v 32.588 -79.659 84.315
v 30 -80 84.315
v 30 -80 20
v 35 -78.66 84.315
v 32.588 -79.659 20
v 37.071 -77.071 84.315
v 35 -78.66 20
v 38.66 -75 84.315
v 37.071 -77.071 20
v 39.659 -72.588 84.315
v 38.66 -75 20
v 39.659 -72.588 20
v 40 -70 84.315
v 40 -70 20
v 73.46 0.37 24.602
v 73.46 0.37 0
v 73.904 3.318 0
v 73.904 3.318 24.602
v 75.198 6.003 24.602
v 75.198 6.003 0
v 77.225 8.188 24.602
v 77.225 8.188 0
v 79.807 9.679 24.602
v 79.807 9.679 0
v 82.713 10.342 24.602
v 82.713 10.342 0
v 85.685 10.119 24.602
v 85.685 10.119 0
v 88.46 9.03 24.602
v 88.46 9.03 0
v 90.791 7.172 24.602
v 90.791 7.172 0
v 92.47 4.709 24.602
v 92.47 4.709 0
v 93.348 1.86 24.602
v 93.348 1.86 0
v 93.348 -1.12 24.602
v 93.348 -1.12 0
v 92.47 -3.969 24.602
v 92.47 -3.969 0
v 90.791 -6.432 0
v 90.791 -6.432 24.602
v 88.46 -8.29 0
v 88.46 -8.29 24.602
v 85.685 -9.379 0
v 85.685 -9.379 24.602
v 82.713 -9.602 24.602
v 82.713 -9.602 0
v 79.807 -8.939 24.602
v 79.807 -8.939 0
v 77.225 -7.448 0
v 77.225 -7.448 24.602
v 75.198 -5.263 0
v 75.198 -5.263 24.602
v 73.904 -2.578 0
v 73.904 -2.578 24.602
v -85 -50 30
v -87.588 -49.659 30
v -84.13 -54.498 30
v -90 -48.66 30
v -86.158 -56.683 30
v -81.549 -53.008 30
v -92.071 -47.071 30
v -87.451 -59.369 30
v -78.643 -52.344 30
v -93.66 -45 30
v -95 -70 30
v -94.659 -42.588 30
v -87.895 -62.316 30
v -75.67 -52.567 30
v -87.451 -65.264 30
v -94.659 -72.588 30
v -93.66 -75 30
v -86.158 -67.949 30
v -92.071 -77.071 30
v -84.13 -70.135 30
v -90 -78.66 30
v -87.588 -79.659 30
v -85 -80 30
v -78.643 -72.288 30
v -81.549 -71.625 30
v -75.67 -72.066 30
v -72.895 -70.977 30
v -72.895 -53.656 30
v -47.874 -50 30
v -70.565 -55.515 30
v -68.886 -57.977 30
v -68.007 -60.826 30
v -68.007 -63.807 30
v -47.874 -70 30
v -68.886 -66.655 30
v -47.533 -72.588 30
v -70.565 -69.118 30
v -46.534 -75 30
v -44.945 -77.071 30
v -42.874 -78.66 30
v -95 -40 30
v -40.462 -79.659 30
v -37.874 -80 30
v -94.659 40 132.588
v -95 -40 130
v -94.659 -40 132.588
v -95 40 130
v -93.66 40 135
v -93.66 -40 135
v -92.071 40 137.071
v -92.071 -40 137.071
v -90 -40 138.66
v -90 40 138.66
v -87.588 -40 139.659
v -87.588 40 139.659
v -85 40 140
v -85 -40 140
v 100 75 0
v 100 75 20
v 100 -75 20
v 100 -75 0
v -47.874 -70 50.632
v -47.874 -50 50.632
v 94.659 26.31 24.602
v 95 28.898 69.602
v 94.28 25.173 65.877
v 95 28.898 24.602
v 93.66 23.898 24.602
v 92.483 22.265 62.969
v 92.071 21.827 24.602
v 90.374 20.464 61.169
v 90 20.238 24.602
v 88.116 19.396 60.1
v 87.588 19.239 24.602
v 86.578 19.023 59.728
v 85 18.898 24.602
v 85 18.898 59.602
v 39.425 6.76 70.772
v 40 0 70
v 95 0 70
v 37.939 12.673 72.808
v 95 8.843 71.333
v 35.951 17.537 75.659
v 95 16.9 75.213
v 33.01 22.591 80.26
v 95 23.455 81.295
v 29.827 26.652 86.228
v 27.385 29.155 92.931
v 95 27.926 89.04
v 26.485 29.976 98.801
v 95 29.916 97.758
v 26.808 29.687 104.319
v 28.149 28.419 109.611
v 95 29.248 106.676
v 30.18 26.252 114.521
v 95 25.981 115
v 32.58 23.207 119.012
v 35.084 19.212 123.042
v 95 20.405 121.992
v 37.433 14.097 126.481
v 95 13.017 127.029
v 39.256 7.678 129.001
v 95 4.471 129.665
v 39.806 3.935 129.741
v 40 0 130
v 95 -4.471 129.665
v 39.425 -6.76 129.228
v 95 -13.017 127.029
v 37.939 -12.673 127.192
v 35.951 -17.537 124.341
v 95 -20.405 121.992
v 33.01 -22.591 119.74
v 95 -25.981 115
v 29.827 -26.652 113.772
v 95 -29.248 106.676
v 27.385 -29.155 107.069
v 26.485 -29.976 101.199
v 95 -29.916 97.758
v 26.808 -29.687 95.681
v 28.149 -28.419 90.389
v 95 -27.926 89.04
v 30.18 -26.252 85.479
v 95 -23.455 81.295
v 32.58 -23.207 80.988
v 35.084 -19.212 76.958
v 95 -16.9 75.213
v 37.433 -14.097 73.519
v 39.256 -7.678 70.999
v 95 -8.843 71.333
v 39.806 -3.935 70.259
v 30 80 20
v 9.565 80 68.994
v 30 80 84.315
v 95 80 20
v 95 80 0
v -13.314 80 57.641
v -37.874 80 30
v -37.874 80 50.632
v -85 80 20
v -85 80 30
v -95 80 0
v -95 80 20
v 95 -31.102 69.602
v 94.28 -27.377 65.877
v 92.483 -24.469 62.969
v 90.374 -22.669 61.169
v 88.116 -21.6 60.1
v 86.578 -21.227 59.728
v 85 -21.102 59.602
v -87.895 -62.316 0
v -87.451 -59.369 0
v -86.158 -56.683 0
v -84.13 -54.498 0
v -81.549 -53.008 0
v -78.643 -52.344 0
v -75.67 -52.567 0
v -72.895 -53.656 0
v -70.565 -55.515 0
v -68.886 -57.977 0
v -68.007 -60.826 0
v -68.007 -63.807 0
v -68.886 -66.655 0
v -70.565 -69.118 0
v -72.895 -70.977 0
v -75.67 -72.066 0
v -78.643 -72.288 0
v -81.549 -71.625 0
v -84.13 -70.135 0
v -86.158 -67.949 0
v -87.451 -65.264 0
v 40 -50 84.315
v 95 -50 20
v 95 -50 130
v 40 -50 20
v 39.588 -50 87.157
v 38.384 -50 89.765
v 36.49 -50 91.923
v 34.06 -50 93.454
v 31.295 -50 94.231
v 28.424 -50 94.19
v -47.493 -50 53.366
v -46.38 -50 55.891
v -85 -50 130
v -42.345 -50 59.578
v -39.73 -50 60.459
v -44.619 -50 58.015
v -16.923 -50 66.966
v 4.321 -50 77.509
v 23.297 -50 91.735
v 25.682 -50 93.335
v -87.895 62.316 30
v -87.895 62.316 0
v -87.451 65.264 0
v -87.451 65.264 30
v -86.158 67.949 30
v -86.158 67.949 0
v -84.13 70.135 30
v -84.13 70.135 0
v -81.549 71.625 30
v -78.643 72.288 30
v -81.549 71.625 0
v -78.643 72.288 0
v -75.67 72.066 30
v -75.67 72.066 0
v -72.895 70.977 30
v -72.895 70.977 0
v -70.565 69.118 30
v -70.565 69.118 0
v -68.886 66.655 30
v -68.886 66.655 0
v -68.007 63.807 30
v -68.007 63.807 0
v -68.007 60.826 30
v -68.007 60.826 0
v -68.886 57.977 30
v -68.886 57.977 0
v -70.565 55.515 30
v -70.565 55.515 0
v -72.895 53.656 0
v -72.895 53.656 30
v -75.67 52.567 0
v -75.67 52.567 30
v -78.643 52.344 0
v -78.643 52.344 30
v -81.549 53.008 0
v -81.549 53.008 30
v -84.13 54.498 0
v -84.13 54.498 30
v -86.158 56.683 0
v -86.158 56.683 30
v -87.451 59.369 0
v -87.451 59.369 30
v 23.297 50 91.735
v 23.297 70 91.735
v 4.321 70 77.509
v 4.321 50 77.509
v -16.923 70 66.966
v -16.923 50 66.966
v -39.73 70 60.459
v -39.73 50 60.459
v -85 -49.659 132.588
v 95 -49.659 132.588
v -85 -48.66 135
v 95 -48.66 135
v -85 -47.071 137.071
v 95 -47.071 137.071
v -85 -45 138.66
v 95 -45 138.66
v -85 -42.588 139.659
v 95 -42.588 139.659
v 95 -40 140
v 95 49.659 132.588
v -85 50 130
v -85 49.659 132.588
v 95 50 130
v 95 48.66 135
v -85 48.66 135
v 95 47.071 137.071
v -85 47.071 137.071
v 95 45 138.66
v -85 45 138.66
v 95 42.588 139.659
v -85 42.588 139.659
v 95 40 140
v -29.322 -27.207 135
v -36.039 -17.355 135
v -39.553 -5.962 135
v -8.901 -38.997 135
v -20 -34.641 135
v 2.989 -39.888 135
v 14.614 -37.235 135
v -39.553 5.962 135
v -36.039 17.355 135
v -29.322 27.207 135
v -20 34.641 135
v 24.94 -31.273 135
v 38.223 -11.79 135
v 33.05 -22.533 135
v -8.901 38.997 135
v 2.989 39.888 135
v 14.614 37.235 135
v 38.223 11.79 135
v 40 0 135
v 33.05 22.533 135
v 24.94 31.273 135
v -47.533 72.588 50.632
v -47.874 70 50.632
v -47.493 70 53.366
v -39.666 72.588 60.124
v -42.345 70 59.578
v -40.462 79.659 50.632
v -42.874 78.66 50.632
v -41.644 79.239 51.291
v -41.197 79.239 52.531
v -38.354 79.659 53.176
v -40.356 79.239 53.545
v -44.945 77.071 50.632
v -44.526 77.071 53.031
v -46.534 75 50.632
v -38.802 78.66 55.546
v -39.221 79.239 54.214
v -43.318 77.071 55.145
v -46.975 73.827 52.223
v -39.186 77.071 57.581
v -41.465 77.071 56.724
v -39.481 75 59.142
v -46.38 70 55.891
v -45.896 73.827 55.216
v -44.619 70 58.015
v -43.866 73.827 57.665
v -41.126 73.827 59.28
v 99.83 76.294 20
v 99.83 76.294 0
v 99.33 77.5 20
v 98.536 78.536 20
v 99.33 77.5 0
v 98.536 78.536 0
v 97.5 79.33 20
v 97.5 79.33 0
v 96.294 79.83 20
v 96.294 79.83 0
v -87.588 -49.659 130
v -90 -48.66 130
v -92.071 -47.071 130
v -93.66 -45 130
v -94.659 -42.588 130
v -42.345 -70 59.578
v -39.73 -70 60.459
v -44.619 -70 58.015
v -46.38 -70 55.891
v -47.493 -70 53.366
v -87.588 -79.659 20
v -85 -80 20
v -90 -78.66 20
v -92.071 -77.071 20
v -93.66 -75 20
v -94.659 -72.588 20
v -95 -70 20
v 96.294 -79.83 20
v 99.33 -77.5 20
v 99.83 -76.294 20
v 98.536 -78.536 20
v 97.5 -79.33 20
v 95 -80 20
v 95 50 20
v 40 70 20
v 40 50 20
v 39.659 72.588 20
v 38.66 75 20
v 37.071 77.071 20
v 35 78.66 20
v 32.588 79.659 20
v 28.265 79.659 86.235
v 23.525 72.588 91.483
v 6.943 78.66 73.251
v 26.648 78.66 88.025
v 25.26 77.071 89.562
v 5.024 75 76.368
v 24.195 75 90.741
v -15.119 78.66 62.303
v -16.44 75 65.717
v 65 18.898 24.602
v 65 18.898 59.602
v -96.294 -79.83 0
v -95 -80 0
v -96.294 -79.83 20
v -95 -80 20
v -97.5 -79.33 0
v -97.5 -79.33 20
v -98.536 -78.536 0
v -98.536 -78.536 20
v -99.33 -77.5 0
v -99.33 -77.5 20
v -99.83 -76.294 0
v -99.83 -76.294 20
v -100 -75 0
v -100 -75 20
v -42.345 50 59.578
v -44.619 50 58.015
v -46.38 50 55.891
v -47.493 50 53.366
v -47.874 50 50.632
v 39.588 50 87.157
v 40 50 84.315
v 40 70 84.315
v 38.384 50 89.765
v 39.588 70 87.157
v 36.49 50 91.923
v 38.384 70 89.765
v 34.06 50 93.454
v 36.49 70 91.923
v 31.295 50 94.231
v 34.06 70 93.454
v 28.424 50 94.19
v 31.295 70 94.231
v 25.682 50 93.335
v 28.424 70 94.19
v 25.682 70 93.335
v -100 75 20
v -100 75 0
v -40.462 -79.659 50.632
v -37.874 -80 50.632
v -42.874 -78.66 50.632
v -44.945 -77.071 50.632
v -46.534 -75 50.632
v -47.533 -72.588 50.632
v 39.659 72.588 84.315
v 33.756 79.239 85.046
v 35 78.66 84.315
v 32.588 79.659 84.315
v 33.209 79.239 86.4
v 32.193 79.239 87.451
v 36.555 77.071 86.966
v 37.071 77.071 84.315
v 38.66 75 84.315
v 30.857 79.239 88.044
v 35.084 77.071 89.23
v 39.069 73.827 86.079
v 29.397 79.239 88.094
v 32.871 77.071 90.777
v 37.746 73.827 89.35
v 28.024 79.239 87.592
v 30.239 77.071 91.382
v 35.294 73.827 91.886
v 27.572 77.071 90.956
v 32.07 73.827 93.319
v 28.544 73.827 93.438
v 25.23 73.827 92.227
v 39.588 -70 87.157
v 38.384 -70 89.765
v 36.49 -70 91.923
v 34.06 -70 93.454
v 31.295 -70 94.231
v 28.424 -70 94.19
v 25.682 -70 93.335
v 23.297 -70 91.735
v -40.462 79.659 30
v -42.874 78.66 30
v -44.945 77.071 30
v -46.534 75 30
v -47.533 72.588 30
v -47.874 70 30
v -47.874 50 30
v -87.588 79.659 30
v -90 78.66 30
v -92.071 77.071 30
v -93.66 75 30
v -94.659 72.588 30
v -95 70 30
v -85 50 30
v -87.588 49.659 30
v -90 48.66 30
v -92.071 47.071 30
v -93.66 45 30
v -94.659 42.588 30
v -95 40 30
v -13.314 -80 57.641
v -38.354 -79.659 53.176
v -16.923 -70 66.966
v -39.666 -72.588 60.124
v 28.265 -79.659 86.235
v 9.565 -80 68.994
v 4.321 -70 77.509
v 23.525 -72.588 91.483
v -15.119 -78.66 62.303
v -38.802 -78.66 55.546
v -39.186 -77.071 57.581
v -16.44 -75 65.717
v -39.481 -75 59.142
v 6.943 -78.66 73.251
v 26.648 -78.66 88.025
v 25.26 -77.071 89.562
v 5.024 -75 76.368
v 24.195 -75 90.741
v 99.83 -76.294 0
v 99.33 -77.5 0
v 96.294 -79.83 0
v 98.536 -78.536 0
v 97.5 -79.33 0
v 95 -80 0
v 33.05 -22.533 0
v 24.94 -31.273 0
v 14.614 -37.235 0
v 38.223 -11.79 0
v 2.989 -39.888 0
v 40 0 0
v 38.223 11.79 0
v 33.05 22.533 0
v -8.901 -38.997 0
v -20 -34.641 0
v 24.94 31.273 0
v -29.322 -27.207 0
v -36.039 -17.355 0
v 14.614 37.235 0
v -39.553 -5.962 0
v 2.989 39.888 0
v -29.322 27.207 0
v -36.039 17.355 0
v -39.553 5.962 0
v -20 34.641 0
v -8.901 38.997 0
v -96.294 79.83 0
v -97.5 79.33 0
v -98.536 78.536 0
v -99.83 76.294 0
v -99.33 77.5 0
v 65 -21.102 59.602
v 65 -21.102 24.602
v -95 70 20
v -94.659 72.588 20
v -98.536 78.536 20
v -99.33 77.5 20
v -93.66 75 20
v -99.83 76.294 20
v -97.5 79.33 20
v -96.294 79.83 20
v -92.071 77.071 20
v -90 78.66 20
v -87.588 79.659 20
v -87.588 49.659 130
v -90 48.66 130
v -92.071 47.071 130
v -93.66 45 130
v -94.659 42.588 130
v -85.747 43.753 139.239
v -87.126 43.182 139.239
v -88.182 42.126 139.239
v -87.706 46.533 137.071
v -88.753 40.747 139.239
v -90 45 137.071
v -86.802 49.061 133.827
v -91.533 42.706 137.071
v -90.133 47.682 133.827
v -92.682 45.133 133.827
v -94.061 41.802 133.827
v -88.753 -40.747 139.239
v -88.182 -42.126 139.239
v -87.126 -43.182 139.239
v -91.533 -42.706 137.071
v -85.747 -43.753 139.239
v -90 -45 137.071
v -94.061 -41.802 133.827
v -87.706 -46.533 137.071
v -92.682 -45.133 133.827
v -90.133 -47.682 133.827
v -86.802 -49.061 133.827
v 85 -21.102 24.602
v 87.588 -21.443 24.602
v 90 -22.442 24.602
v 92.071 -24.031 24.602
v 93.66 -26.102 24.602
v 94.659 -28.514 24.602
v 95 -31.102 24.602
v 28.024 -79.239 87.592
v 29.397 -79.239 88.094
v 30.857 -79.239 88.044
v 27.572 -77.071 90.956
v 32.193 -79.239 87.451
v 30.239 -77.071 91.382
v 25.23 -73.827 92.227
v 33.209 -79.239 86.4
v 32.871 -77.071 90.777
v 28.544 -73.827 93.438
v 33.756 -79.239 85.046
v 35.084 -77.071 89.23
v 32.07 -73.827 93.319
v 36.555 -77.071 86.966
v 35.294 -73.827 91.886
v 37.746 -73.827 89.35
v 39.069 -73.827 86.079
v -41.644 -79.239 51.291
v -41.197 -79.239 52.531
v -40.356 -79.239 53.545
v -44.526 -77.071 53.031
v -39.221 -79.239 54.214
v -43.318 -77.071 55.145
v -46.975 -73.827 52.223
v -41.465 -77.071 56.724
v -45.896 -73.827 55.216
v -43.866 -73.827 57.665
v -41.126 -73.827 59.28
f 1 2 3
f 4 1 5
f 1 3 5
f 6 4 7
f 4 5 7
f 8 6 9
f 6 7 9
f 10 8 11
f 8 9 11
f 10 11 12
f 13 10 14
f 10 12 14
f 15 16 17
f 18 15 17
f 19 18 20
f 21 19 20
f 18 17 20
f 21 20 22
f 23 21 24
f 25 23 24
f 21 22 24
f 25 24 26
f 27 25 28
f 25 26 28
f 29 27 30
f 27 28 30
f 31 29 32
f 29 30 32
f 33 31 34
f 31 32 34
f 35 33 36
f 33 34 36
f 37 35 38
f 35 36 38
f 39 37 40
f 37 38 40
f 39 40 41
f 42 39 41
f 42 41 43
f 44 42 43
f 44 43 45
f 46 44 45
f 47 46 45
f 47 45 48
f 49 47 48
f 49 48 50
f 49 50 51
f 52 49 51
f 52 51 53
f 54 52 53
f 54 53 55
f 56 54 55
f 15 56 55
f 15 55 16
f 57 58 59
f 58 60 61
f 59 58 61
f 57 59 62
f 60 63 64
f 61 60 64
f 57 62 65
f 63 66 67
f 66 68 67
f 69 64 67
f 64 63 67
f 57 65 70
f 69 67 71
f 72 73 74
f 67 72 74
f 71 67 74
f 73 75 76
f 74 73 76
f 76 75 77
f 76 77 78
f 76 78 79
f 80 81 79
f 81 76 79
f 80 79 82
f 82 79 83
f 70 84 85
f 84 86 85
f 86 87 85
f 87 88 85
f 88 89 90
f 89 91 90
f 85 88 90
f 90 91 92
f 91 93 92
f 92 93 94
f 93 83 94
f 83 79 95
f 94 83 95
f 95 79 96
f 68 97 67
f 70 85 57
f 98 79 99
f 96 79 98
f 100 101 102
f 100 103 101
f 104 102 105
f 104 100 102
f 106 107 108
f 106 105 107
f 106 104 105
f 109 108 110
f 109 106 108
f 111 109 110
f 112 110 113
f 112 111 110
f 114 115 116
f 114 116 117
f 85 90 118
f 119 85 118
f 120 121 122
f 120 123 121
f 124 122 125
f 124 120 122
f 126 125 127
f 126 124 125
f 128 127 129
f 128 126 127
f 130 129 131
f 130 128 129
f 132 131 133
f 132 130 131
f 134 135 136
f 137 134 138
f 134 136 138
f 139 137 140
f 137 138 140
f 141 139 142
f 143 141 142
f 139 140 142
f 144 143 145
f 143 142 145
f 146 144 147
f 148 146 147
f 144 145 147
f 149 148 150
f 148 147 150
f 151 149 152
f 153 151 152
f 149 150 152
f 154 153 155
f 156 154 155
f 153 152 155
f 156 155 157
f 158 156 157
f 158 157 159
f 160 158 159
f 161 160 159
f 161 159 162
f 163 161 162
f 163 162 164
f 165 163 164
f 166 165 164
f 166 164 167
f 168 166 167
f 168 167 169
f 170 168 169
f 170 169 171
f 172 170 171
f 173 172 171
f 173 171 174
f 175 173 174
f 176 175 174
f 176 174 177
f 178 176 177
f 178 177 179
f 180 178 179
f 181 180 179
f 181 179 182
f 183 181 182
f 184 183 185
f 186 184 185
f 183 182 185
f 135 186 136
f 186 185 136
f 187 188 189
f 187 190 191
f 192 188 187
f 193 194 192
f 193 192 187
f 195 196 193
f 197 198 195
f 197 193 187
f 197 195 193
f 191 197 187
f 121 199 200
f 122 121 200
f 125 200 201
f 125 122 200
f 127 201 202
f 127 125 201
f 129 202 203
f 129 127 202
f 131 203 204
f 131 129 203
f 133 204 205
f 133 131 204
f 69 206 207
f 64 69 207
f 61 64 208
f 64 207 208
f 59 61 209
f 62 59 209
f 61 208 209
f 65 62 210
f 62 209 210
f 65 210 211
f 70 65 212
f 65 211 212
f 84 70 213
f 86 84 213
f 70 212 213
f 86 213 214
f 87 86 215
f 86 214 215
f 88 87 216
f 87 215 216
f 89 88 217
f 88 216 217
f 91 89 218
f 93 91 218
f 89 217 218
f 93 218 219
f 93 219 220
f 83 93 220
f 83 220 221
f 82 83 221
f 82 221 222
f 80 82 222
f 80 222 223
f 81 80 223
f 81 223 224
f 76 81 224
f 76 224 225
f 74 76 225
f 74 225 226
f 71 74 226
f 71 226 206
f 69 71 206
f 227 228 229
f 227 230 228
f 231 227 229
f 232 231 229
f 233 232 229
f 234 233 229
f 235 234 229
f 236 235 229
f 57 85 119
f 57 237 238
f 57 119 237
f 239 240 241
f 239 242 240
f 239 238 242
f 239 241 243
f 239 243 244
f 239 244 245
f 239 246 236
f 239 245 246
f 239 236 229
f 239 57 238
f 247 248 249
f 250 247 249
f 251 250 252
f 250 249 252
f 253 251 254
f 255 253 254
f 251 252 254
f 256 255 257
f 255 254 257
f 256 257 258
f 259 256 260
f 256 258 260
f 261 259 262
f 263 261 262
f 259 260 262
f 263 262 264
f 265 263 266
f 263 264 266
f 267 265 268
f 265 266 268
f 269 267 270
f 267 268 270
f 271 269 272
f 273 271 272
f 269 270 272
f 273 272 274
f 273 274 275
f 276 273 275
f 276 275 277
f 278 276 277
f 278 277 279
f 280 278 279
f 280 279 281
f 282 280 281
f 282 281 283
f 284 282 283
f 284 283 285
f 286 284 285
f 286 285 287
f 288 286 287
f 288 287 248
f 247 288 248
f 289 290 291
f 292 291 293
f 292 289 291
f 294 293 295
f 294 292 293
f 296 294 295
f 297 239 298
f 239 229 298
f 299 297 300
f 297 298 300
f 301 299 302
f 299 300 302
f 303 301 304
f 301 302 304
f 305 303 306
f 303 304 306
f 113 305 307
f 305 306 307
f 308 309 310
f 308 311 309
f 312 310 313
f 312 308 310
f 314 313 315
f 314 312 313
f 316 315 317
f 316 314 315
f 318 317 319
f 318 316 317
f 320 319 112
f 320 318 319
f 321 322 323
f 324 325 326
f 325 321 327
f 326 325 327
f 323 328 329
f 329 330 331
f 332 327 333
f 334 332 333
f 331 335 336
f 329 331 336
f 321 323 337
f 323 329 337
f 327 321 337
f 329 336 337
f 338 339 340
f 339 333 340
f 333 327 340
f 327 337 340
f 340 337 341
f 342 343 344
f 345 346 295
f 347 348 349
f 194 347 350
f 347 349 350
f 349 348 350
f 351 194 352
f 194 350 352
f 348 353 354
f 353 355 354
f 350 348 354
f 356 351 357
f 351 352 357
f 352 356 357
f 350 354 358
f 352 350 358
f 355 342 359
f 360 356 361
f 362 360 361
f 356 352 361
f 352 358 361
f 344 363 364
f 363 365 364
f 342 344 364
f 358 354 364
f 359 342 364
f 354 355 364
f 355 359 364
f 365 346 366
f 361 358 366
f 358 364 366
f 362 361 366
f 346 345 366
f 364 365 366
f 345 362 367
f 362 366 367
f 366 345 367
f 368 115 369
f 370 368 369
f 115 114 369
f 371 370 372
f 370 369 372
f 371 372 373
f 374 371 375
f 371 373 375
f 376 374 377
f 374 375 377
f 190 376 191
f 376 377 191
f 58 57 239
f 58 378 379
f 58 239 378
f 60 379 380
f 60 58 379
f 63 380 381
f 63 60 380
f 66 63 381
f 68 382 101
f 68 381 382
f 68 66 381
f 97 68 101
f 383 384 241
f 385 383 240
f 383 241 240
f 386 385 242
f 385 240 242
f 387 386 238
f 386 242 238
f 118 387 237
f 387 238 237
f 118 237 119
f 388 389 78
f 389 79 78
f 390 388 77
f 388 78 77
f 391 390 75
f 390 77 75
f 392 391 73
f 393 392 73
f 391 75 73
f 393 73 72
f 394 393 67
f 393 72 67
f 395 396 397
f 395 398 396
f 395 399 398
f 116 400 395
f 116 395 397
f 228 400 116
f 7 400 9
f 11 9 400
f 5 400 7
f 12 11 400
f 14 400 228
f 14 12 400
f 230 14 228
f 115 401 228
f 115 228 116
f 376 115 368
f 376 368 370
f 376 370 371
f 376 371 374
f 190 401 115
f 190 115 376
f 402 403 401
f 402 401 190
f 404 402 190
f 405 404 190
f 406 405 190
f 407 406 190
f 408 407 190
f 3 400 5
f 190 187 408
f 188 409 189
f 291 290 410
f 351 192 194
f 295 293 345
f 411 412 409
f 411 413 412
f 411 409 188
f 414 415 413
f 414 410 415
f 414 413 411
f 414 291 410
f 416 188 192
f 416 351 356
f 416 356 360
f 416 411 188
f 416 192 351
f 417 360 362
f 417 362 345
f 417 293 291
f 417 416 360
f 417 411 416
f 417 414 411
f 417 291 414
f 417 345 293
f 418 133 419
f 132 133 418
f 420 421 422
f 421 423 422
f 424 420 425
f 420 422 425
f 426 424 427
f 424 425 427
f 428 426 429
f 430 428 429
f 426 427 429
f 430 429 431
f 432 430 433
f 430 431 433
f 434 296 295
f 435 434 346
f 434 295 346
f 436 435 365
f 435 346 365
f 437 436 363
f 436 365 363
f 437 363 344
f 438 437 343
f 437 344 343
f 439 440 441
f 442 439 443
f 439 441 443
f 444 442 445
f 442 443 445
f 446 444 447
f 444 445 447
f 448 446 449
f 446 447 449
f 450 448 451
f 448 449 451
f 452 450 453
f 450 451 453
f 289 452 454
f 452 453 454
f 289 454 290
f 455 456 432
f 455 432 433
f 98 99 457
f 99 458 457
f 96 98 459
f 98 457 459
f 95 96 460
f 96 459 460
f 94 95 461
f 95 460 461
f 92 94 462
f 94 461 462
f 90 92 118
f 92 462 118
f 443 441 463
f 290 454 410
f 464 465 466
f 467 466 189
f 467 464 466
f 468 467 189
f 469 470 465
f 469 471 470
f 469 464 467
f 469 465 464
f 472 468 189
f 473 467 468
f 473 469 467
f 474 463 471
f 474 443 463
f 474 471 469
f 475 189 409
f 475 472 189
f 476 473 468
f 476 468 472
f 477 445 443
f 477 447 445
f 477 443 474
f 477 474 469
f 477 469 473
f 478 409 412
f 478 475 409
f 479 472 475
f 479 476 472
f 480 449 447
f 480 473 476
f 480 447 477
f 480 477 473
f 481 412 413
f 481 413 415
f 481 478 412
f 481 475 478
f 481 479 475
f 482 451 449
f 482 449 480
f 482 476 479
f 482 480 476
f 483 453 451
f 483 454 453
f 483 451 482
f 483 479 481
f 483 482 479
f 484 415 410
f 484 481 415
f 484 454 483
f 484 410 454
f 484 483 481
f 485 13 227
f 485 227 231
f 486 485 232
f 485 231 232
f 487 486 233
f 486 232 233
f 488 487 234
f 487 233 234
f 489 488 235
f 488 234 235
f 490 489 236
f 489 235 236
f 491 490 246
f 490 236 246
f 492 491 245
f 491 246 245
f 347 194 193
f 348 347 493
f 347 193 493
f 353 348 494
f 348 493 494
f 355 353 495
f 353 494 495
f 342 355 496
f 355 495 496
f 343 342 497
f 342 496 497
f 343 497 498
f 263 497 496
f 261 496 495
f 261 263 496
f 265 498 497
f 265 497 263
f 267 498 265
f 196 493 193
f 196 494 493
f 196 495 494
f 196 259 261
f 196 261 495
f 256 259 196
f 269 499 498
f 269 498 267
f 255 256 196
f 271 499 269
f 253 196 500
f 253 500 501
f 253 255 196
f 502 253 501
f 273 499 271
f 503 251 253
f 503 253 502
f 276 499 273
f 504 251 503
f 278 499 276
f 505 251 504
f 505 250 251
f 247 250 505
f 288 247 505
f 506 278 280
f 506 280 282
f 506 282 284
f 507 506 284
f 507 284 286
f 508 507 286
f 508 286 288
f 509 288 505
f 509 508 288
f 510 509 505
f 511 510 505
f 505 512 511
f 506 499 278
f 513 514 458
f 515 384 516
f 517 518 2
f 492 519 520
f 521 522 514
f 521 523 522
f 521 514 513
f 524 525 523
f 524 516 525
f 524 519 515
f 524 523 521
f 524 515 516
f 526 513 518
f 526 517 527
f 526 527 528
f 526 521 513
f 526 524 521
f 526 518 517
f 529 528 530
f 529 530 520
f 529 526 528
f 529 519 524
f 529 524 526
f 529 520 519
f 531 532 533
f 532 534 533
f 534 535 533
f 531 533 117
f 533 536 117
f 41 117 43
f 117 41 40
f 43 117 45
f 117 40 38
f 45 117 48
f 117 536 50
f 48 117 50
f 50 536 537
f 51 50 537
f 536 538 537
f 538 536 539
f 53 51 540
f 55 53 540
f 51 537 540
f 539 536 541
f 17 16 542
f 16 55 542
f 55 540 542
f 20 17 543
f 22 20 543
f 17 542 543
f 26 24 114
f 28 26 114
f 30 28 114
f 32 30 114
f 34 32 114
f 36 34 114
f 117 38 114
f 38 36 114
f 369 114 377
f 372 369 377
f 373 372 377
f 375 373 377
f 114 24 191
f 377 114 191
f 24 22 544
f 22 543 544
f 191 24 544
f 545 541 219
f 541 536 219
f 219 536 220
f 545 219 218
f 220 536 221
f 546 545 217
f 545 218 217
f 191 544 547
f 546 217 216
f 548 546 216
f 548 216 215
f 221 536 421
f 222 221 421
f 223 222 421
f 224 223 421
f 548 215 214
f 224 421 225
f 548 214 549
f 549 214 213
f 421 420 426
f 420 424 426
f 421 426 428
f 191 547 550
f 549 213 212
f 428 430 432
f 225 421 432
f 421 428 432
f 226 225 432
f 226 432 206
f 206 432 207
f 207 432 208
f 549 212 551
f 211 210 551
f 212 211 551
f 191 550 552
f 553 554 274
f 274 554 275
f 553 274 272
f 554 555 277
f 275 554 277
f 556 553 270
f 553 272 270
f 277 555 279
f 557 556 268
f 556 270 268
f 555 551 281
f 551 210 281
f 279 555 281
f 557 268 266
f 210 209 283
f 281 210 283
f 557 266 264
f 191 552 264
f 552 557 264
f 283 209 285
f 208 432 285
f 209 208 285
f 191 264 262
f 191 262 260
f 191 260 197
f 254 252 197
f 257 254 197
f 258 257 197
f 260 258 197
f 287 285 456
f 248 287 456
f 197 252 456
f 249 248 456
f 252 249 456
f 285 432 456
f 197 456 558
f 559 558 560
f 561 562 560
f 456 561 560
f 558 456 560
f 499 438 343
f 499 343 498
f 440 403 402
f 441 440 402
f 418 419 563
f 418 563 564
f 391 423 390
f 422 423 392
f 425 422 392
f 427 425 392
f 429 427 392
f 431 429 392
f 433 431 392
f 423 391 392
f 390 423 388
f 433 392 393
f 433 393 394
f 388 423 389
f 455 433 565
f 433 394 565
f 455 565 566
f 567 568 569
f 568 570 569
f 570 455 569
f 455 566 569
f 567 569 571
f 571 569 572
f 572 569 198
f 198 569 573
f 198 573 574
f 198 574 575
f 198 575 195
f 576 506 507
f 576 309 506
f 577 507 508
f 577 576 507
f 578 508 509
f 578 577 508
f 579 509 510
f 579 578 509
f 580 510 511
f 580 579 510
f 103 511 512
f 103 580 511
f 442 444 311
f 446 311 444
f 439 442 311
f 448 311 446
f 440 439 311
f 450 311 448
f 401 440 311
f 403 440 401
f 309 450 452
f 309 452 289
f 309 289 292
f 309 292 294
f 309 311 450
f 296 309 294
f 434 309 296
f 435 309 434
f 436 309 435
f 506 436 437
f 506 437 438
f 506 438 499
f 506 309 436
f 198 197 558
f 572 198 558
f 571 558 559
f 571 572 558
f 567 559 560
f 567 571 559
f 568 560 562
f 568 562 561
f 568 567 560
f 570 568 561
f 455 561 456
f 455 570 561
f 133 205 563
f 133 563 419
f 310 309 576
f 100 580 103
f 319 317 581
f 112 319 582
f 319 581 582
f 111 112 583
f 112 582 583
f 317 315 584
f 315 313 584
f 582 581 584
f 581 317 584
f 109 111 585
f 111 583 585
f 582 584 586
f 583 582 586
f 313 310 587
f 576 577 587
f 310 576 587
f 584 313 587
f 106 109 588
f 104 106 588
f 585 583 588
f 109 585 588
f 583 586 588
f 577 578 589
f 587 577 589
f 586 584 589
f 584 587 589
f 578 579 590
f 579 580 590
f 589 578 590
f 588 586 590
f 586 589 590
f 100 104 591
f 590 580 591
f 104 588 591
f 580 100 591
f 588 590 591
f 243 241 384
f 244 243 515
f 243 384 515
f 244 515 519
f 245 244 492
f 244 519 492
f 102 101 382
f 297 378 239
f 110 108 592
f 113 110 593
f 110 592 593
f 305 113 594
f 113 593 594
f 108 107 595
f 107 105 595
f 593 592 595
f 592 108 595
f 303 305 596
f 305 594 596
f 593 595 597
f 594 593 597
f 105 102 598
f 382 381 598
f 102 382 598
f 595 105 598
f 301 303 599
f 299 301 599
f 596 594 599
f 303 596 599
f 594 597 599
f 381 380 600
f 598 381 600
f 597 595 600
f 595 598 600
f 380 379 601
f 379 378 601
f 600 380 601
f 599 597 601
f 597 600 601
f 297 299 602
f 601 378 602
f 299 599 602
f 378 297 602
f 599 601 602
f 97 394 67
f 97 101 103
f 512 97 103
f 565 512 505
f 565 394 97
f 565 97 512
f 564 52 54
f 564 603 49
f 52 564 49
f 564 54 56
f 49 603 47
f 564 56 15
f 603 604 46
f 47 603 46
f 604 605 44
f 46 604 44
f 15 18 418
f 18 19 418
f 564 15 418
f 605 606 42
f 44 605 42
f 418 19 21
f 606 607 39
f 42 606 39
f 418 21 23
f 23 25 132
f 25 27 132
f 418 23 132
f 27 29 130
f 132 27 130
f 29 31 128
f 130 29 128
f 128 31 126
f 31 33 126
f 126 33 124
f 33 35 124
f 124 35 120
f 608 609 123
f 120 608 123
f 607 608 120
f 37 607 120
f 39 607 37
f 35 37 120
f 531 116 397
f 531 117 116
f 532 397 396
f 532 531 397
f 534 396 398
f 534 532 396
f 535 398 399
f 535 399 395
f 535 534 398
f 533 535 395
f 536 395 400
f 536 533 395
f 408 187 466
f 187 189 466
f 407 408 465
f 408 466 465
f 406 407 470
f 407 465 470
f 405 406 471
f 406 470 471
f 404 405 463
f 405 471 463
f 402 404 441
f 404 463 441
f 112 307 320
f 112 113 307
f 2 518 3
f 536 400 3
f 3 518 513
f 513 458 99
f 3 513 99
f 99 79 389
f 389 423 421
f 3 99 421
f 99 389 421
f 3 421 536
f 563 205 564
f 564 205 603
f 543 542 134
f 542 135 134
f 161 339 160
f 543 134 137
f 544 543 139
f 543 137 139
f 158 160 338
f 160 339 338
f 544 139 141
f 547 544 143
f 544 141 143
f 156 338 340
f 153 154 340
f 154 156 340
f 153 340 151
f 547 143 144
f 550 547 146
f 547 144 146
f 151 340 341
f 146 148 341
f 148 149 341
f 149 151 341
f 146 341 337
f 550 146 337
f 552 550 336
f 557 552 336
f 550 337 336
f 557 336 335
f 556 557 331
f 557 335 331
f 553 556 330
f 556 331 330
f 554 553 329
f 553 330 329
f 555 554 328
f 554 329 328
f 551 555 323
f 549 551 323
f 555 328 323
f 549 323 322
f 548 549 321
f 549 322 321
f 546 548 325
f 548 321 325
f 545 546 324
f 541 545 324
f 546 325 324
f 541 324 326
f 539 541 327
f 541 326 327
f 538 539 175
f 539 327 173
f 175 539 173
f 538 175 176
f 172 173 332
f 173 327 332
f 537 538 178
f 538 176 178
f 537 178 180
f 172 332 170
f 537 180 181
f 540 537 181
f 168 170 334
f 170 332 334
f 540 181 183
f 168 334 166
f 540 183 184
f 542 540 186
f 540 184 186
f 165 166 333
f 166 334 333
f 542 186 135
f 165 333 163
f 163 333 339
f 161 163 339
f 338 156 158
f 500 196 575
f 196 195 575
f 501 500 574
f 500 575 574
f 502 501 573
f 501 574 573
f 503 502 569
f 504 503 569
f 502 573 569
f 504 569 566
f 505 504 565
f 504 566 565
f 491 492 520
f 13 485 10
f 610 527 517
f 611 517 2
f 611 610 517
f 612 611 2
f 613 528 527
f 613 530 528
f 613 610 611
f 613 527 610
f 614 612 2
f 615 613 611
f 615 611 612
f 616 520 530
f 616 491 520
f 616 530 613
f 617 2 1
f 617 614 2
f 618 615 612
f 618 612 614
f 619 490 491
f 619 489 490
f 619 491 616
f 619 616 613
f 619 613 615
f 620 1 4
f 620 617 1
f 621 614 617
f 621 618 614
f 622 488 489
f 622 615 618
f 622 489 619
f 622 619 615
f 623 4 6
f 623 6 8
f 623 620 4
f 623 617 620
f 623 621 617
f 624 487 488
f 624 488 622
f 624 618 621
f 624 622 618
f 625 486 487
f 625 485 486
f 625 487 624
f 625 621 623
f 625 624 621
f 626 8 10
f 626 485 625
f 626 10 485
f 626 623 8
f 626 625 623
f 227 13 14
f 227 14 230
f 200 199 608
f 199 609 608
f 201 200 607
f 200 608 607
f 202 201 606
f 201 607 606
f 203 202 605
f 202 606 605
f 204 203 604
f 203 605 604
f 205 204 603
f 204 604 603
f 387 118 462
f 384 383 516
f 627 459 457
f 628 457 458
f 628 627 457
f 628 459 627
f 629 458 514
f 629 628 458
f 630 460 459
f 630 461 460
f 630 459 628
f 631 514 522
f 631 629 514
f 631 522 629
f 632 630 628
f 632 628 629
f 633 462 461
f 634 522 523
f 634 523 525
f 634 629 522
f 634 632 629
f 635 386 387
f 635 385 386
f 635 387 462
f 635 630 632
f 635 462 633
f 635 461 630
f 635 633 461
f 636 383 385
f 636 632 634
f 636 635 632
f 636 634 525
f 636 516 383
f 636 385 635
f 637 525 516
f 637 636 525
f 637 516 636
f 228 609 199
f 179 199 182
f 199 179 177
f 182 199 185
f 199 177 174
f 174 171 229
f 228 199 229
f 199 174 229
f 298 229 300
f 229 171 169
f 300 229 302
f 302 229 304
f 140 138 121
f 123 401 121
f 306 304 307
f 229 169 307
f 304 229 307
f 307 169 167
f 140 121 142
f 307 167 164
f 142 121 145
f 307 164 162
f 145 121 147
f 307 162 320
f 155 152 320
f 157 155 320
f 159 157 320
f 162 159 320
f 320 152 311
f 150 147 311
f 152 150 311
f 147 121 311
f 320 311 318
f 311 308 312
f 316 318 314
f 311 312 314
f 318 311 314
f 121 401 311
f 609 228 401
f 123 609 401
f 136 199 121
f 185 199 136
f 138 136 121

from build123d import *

# Parameters (mm, degrees)
SKETCH1_W                   = 135
SKETCH1_H                   = 110
BOSS_EXTRUDE1_DEPTH         = 100
BOSS_EXTRUDE2_DEPTH         = 29.999999629
BOSS_EXTRUDE3_START         = 30.000000371
BOSS_EXTRUDE3_DEPTH         = 30.000000371
SKETCH4_W                   = 135
SKETCH4_H                   = 100
BOSS_EXTRUDE4_DEPTH         = 30
BOSS_EXTRUDE5_DEPTH         = 55
SKETCH6_W                   = 20
SKETCH6_H                   = 160
BOSS_EXTRUDE6_DEPTH         = 5
SKETCH7_W                   = 20
SKETCH7_H                   = 160
BOSS_EXTRUDE7_DEPTH         = 5
CUT_EXTRUDE1_START          = -29.999999629
CUT_EXTRUDE1_DEPTH          = 29.999999629
CUT_EXTRUDE2_DEPTH          = 30.000000371
SKETCH10_W                  = 35
SKETCH10_H                  = 40
CUT_EXTRUDE3_DEPTH          = 30
HOLE1_D                     = 80
HOLE1_DEPTH                 = 135
HOLE2_REACH                 = 255.032
HOLE2_BORE_R                = 30
F_3_4_CLEARANCE_HOLE1_D     = 20
F_3_4_CLEARANCE_HOLE1_DEPTH = 24.602326997
F_3_4_CLEARANCE_HOLE2_D     = 20
FILLET1_R                   = 5
FILLET2_R                   = 10


with BuildPart() as part:
    # Sketch1 → Boss-Extrude1 (new body)
    with BuildSketch(Plane(origin=(0, 50.000000371, 0), x_dir=(1, 0, 0), z_dir=(0, 1, 0))):
        with Locations((-27.5, -55)):
            Rectangle(SKETCH1_W, SKETCH1_H)
    extrude(amount=-BOSS_EXTRUDE1_DEPTH)

    # Sketch2 → Boss-Extrude2 (add)
    with BuildSketch(Plane(origin=(0, 50.000000371, 0), x_dir=(-1, 0, 0), z_dir=(0, 1, 0))):
        with BuildLine():
            Line((-40, 0), (-40, 110))
            ThreePointArc((-40, 110), (20.288540009, 65.716947722), (95, 61.989412153))
            Line((95, 61.989412153), (95, 0))
            Line((95, 0), (-40, 0))
        make_face()
    extrude(amount=BOSS_EXTRUDE2_DEPTH)

    # Sketch3 → Boss-Extrude3 (add)
    with BuildSketch(Plane.XZ.offset(49.999999629).offset(BOSS_EXTRUDE3_START)):
        with BuildLine():
            Line((40, 0), (-95, 0))
            Line((-95, 0), (-95, 61.989412153))
            ThreePointArc((-95, 61.989412153), (-20.288540009, 65.716947722), (40, 110))
            Line((40, 110), (40, 0))
        make_face()
    extrude(amount=-BOSS_EXTRUDE3_DEPTH)

    # Sketch4 → Boss-Extrude4 (add)
    with BuildSketch(Plane.XY.offset(110)):
        with Locations((-27.5, 3.71e-07)):
            Rectangle(SKETCH4_W, SKETCH4_H)
    extrude(amount=BOSS_EXTRUDE4_DEPTH)

    # Sketch5 → Boss-Extrude5 (add)
    with BuildSketch(Plane(origin=(40, 0, 0), x_dir=(0, 0, -1), z_dir=(1, 0, 0))):
        Polygon((-140, 50.000000371), (-20, 50.000000371), (-20, 80), (0, 80), (0, -80), (-20, -80), (-20, -49.999999629), (-140, -49.999999629), align=None)
    extrude(amount=BOSS_EXTRUDE5_DEPTH)

    # Sketch6 → Boss-Extrude6 (add)
    with BuildSketch(Plane.ZY.offset(95)):
        with Locations((10, 0)):
            Rectangle(SKETCH6_W, SKETCH6_H)
    extrude(amount=BOSS_EXTRUDE6_DEPTH)

    # Sketch7 → Boss-Extrude7 (add)
    with BuildSketch(Plane(origin=(95, 0, 0), x_dir=(0, 0, -1), z_dir=(1, 0, 0))):
        with Locations((-10, 0)):
            Rectangle(SKETCH7_W, SKETCH7_H)
    extrude(amount=BOSS_EXTRUDE7_DEPTH)

    # Sketch8 → Cut-Extrude1 (cut)
    with BuildSketch(Plane(origin=(0, 80, 0), x_dir=(-1, 0, 0), z_dir=(0, 1, 0)).offset(CUT_EXTRUDE1_START)):
        with BuildLine():
            Line((47.874205856, 59.186990419), (47.874205856, 30))
            Line((47.874205856, 30), (95, 30))
            Line((95, 30), (95, 61.989412153))
            ThreePointArc((95, 61.989412153), (71.565380287, 58.431076847), (47.874205856, 59.186990419))
        make_face()
    extrude(amount=CUT_EXTRUDE1_DEPTH, mode=Mode.SUBTRACT)

    # Sketch9 → Cut-Extrude2 (cut)
    with BuildSketch(Plane.XZ.offset(80)):
        with BuildLine():
            Line((-47.874205856, 30), (-47.874205856, 59.186990419))
            ThreePointArc((-47.874205856, 59.186990419), (-71.565380287, 58.431076847), (-95, 61.989412153))
            Line((-95, 61.989412153), (-95, 30))
            Line((-95, 30), (-47.874205856, 30))
        make_face()
    extrude(amount=-CUT_EXTRUDE2_DEPTH, mode=Mode.SUBTRACT)

    # Sketch10 → Cut-Extrude3 (cut)
    with BuildSketch(Plane(origin=(95, 0, 0), x_dir=(0, 0, -1), z_dir=(1, 0, 0))):
        with Locations((-42.102326997, -1.102144565)):
            Rectangle(SKETCH10_W, SKETCH10_H)
    extrude(amount=-CUT_EXTRUDE3_DEPTH, mode=Mode.SUBTRACT)

    # Hole1
    with Locations(Plane(origin=(0, 0, 0), x_dir=(-1, 0, 0), z_dir=(0, 0, -1))):
        with Locations((0, 0)):
            Hole(HOLE1_D / 2, depth=HOLE1_DEPTH)

    # Hole2 bore → Hole2 (cut, up to next)
    with BuildSketch(Plane(origin=(95, 0, 0), x_dir=(0, 0, -1), z_dir=(1, 0, 0)), mode=Mode.PRIVATE) as hole2_sk1:
        with Locations((-99.999999554, 3.71e-07)):
            Circle(HOLE2_BORE_R)
    hole2_tool1 = extrude(hole2_sk1.sketch, amount=-HOLE2_REACH, mode=Mode.PRIVATE) & part.part
    add(hole2_tool1.solids().sort_by_distance((95, 0, 100))[0], mode=Mode.SUBTRACT)

    # 3/4 Clearance Hole1
    with Locations(Plane.XY.offset(24.602326997)):
        with Locations((83.46, 0.37)):
            Hole(F_3_4_CLEARANCE_HOLE1_D / 2, depth=F_3_4_CLEARANCE_HOLE1_DEPTH)

    # 3/4 Clearance Hole2 (through all)
    with Locations(Plane.XY.offset(30)):
        with Locations((-77.895356155, -62.316284924), (-77.895356155, 62.316284924)):
            Hole(F_3_4_CLEARANCE_HOLE2_D / 2)

    # Fillet1
    fillet1_edges = [part.edges().sort_by_distance(p)[0] for p in [
        (-100, -80, 10),
        (-100, 80, 10),
        (100, -80, 10),
        (100, 80, 10),
    ]]
    fillet(fillet1_edges, radius=FILLET1_R)

    # Fillet2
    fillet2_edges = [part.edges().sort_by_distance(p)[0] for p in [
        (1.227361836, 80, 75.662254106),
        (-47.874205856, 65.000000185, 59.186990419),
        (-47.874205856, 80, 44.593495209),
        (-95, -80, 25),
        (-47.874205856, -64.999999815, 59.186990419),
        (-47.874205856, -80, 44.593495209),
        (-95, 50.000000371, 85),
        (95, -21.102144565, 42.102326997),
        (95, 18.897855435, 42.102326997),
        (95, -1.102144565, 59.602326997),
        (40, 65.000000185, 110),
        (40, 80, 65),
        (-95, -49.999999629, 85),
        (40, -64.999999815, 110),
        (1.227361836, -80, 75.662254106),
        (0, 50.000000371, 140),
        (-95, 3.71e-07, 140),
        (0, -49.999999629, 140),
        (40, -80, 65),
        (-95, 80, 25),
    ]]
    fillet(fillet2_edges, radius=FILLET2_R)


solid = part.part
